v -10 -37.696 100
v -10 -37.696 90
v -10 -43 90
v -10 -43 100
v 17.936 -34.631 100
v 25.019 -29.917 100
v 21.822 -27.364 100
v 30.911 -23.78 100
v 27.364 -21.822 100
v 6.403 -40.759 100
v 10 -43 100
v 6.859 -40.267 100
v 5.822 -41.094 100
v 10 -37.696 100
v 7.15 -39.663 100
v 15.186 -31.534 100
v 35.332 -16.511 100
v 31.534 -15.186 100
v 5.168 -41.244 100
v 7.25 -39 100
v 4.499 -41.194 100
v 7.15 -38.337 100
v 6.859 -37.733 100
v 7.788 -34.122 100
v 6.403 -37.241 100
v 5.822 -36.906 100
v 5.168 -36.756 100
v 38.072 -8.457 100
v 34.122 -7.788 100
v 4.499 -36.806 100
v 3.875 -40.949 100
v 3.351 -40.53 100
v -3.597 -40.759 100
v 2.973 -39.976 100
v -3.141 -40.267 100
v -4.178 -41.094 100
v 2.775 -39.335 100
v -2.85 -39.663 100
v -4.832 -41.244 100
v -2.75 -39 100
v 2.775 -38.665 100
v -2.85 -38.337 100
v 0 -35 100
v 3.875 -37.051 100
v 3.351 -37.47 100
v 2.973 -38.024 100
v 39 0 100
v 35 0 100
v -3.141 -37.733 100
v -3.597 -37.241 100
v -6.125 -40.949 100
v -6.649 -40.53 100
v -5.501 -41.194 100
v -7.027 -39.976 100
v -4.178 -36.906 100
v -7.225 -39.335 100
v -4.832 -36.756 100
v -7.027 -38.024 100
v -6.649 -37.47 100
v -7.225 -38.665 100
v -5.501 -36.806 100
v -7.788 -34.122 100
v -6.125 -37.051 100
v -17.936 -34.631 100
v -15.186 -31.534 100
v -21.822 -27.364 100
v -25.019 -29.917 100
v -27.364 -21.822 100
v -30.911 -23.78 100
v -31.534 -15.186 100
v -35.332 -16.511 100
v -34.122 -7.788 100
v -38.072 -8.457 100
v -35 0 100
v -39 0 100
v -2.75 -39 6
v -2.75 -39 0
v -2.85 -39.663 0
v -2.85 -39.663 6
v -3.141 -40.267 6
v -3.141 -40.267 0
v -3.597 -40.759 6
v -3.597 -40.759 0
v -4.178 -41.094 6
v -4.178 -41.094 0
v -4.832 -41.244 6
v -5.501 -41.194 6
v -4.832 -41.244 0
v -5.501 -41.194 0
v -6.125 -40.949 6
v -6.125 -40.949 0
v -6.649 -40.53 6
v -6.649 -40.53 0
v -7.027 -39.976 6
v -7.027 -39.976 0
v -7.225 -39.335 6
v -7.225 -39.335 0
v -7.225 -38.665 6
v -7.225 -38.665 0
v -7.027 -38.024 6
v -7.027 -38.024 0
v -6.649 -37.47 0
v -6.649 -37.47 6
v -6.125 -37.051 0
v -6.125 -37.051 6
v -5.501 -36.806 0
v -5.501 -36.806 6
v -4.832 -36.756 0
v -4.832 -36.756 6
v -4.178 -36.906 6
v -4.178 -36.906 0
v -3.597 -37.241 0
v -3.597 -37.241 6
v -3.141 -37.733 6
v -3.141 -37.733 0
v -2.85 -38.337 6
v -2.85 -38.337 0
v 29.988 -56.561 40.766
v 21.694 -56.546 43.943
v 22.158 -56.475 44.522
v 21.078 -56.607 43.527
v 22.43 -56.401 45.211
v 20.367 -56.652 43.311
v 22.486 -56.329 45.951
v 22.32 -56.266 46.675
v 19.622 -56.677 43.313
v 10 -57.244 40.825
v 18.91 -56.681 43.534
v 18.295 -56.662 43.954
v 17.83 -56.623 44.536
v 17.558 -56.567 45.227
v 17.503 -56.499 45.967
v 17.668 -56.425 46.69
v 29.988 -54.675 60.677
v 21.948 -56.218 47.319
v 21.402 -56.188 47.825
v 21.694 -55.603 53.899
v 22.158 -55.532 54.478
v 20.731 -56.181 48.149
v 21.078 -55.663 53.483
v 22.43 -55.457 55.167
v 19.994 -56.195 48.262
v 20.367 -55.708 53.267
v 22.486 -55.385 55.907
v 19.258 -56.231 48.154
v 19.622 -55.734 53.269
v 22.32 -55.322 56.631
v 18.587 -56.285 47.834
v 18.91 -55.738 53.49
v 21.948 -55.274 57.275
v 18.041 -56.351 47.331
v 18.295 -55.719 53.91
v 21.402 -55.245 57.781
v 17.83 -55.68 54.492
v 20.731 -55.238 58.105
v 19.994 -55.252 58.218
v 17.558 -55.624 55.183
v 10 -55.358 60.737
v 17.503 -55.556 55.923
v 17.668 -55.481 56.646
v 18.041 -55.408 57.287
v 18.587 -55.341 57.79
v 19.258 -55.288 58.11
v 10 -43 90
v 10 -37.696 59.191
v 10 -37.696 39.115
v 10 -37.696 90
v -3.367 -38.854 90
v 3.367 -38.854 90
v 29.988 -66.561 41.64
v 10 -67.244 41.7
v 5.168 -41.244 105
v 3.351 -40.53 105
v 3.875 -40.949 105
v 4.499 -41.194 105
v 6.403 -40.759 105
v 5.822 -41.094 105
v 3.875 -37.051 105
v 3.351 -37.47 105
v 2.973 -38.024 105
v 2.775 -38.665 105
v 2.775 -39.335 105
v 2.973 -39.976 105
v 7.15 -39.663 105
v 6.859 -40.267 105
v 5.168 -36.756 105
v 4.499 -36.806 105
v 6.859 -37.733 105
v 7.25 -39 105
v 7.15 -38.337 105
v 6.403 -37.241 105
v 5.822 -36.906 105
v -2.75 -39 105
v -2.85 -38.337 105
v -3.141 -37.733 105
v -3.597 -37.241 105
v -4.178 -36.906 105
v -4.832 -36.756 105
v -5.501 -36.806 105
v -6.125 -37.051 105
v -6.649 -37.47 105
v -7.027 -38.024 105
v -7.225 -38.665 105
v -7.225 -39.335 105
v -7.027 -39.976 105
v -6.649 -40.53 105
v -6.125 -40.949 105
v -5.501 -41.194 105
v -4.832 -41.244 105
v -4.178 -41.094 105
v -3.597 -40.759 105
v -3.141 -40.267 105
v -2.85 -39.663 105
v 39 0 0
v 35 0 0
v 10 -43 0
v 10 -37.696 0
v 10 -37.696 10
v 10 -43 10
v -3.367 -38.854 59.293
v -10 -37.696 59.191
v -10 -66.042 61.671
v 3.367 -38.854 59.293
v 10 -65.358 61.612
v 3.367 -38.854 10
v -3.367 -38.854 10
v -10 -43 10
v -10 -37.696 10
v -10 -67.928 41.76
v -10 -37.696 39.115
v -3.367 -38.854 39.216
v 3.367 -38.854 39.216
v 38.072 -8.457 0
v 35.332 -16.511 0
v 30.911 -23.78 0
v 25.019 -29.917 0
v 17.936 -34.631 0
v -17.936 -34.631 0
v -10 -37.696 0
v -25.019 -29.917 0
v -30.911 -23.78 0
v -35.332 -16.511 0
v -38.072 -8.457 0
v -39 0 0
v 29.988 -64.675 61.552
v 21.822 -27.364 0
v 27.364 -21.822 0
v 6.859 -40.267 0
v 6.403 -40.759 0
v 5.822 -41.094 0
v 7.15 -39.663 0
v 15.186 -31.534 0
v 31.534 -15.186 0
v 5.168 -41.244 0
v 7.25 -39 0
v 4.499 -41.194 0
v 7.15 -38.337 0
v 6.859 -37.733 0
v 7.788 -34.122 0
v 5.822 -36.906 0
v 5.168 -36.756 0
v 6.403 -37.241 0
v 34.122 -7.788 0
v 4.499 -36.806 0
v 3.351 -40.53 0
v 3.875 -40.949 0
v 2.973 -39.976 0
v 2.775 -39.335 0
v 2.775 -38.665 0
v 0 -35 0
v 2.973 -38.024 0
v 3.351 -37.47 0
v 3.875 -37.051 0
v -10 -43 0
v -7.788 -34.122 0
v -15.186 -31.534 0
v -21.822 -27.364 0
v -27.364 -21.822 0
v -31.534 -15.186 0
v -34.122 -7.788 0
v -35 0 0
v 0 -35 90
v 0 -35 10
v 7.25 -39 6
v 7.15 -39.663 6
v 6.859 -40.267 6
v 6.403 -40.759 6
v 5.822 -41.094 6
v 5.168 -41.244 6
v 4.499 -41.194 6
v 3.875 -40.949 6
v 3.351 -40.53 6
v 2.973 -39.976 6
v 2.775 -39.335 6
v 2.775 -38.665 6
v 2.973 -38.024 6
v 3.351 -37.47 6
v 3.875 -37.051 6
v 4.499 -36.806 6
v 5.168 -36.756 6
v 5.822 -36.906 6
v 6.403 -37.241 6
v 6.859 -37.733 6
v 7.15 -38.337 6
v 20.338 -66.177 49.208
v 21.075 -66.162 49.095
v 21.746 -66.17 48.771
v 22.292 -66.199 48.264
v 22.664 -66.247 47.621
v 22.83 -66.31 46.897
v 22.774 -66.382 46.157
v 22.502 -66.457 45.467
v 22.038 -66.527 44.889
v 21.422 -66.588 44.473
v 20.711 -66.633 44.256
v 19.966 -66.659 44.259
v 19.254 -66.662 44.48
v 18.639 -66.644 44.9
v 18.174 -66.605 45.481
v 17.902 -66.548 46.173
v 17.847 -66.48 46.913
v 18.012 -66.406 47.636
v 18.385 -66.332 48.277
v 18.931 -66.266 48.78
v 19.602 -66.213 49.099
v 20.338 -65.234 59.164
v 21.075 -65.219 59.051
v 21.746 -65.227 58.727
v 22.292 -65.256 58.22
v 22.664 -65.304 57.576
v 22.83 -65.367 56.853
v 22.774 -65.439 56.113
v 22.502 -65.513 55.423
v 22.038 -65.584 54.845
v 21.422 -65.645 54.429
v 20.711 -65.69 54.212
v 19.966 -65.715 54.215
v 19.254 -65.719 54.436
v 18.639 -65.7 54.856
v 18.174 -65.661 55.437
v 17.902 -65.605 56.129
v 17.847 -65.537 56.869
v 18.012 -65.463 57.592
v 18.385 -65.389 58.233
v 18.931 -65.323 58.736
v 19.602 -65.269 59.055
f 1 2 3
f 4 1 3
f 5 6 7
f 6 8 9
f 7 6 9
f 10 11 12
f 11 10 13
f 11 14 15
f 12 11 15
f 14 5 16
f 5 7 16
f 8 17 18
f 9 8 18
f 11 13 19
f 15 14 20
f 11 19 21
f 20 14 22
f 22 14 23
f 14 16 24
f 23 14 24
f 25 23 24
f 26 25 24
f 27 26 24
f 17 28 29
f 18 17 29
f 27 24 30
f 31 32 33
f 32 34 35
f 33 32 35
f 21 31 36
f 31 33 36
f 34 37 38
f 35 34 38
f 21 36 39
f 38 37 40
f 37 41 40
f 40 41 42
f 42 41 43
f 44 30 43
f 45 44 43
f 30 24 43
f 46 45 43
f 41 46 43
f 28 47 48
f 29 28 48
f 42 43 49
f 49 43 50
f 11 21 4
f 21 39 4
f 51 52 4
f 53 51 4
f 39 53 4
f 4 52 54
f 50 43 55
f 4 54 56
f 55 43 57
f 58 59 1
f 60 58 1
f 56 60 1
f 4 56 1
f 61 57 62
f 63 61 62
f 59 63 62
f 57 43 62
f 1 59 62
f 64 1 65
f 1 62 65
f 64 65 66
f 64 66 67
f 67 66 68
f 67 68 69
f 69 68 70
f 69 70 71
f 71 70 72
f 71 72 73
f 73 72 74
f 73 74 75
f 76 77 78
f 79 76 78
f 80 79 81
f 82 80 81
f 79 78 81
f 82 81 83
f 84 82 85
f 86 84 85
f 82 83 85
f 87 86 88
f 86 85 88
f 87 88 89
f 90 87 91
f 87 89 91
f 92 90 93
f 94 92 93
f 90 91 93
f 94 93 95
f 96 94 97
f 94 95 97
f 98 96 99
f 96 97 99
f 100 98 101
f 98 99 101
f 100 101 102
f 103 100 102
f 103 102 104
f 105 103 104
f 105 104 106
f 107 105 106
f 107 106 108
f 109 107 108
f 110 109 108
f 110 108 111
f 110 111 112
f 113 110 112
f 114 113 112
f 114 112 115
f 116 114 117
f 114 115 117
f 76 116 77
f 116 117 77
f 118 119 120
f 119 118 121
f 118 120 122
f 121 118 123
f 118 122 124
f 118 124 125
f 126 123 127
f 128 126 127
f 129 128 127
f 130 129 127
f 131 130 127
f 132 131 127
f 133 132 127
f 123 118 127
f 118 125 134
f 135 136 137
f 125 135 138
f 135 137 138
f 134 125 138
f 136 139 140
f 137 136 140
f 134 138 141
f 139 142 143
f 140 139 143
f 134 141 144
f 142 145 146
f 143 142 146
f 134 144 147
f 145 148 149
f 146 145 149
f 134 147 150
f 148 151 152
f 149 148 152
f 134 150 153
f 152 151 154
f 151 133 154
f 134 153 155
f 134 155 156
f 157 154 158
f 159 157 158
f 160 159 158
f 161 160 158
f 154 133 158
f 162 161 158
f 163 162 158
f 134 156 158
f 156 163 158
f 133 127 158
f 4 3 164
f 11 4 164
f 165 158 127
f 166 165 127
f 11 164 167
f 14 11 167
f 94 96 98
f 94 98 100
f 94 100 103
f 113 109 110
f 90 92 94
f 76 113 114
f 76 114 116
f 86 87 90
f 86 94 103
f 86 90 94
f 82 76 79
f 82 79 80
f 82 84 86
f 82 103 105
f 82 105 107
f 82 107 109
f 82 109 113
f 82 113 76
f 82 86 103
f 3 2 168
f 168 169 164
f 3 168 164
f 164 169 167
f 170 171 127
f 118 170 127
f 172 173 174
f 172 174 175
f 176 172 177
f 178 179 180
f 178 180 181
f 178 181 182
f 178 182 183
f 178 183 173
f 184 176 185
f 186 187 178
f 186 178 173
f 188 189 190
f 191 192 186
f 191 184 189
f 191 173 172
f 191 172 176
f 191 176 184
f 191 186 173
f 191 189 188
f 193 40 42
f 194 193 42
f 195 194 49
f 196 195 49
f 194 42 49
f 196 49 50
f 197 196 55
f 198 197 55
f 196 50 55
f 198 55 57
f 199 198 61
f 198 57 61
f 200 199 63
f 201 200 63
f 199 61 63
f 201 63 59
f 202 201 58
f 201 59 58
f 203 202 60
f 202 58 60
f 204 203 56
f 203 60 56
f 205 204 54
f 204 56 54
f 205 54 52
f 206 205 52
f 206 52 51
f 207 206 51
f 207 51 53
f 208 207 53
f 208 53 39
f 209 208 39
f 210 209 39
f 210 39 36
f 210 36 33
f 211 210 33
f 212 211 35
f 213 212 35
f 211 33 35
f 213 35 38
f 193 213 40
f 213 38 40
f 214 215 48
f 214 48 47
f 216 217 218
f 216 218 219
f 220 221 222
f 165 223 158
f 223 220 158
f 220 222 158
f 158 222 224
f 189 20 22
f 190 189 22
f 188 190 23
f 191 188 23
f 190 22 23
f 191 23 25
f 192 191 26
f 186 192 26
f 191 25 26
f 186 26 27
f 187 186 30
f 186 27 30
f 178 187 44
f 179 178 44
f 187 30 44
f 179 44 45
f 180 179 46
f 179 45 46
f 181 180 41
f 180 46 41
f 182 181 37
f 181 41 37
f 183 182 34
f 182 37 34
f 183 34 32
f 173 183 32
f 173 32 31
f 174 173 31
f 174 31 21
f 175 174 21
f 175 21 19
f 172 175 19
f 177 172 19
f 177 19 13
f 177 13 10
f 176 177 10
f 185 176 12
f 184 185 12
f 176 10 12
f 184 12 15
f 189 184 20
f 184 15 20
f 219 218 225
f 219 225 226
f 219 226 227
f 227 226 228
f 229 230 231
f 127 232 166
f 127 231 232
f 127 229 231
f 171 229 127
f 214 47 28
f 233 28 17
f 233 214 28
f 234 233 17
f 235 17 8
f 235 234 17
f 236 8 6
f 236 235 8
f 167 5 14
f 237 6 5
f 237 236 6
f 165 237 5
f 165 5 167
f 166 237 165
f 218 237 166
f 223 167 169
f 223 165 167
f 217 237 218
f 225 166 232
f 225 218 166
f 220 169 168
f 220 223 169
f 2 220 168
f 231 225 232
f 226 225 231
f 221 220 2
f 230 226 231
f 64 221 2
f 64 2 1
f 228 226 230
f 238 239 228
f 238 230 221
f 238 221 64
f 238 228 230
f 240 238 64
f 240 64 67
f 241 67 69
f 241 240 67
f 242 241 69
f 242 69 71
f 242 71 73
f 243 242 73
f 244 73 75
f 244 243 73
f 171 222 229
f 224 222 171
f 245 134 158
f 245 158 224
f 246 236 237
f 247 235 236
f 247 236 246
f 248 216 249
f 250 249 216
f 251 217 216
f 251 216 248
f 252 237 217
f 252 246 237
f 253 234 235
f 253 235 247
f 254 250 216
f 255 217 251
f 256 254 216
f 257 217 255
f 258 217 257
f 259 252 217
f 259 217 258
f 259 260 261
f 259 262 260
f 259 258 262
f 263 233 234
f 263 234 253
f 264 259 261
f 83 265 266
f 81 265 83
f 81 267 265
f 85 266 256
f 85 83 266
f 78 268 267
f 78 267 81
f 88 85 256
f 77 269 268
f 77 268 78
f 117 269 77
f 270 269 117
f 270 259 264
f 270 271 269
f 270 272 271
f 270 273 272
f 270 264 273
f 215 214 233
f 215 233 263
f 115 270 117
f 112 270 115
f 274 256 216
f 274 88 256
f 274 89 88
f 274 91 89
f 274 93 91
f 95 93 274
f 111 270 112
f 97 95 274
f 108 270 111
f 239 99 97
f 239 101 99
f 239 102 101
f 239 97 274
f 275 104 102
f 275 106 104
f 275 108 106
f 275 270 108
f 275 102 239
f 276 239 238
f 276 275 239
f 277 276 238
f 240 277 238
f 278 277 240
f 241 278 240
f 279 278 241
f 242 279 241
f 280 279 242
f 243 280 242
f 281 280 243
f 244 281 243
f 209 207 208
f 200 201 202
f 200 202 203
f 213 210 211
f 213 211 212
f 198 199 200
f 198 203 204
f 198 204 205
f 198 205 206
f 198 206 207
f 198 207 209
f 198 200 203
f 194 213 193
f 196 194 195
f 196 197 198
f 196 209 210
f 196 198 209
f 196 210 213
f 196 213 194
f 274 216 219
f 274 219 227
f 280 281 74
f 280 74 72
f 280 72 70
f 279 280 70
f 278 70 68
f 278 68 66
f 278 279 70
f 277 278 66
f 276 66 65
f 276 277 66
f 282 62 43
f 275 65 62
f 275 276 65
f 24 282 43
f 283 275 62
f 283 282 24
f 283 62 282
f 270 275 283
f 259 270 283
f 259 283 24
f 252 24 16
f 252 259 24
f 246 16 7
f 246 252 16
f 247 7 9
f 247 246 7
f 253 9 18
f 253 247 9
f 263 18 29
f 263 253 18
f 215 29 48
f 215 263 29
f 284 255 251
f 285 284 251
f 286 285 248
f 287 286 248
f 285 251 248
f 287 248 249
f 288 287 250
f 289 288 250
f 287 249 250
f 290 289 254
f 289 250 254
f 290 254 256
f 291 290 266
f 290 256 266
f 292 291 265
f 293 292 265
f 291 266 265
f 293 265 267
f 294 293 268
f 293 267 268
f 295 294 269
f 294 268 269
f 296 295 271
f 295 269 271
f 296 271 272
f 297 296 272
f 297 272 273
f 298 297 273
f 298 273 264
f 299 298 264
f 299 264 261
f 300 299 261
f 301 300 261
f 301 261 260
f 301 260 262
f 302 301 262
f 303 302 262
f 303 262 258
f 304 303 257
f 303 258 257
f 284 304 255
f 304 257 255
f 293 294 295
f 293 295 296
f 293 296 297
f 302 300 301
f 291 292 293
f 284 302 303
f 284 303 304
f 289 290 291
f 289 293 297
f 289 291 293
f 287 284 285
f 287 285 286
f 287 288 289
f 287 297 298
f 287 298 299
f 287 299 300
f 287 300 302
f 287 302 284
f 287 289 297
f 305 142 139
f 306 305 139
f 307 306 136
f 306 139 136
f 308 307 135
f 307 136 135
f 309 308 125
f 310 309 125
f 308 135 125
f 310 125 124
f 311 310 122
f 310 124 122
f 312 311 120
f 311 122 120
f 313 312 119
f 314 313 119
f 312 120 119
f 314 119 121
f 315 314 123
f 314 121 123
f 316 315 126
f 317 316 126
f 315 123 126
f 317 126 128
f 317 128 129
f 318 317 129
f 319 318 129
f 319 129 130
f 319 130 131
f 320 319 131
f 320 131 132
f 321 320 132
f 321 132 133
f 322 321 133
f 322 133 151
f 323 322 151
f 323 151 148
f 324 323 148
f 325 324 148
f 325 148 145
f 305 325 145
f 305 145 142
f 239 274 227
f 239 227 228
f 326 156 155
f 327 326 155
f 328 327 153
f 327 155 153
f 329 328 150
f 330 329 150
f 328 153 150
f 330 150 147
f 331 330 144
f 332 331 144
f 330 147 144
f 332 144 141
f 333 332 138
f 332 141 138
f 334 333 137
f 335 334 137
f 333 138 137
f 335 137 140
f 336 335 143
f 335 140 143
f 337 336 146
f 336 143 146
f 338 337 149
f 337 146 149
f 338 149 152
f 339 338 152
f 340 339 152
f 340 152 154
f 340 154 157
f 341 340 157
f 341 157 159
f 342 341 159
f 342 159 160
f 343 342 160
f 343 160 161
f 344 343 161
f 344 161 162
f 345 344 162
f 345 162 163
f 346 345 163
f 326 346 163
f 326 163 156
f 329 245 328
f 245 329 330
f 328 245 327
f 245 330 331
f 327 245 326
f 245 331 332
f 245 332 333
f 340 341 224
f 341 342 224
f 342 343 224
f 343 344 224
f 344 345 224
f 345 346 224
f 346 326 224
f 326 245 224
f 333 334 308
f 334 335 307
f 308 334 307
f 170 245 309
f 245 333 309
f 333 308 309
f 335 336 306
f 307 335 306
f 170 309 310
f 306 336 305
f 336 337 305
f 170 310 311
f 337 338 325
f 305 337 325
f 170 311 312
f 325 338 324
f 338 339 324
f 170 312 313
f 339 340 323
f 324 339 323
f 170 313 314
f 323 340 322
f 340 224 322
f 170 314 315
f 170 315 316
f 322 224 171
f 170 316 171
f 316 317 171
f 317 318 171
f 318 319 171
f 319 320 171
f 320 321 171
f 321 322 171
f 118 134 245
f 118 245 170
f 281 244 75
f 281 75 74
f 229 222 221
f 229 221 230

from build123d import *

# Parameters (mm, degrees)
EXTRUDE_THIN1_DEPTH       = 100
BOSS_EXTRUDE1_START       = -10
BOSS_EXTRUDE1_DEPTH       = 10
SKETCH3_R                 = 2.25
BOSS_EXTRUDE2_DEPTH       = 5
BOSS_EXTRUDE3_DEPTH       = 10
SKETCH5_R                 = 2.25
CUT_EXTRUDE1_DEPTH        = 6
BOSS_EXTRUDE4_REACH       = 121.416
BOSS_EXTRUDE4_END_RADIUS  = 39
SKETCH10_W                = 20
SKETCH10_H                = 20
BOSS_EXTRUDE5_START       = -19.757252304
BOSS_EXTRUDE5_OUTLINE_W   = 20
BOSS_EXTRUDE5_OUTLINE_H   = 20
BOSS_EXTRUDE5_DEPTH       = 19.757252304
BOSS_EXTRUDE5_START_2     = 71.178890271
BOSS_EXTRUDE5_2_OUTLINE_W = 23
BOSS_EXTRUDE5_2_OUTLINE_H = 23
BOSS_EXTRUDE5_2_DEPTH     = 1.821109729
BOSS_EXTRUDE6_DEPTH       = 20
SKETCH12_R                = 2.5
CUT_EXTRUDE2_DEPTH        = 20


with BuildPart() as part:
    # Sketch1 → Extrude-Thin1 (new body)
    with BuildSketch(Plane.XY):
        with BuildLine():
            ThreePointArc((-35, 0), (0, -35), (35, 0))
            Line((35, 0), (39, 0))
            ThreePointArc((39, 0), (0, -39), (-39, 0))
            Line((-39, 0), (-35, 0))
        make_face()
    extrude(amount=EXTRUDE_THIN1_DEPTH)

    # Sketch2 → Boss-Extrude1 (add)
    with BuildSketch(Plane.XY.offset(100).offset(BOSS_EXTRUDE1_START)):
        with BuildLine():
            Line((0, -39), (0, -35))
            Line((0, -35), (-10, -35))
            Line((-10, -35), (-10, -37.69615365))
            ThreePointArc((-10, -37.69615365), (-5.042321274, -38.672664715), (0, -39))
        make_face()
        with BuildLine():
            Line((10, -35), (0, -35))
            Line((0, -35), (0, -39))
            ThreePointArc((0, -39), (5.042321274, -38.672664715), (10, -37.69615365))
            Line((10, -37.69615365), (10, -35))
        make_face()
        with BuildLine():
            ThreePointArc((10, -37.69615365), (5.042321274, -38.672664715), (0, -39))
            ThreePointArc((0, -39), (-5.042321274, -38.672664715), (-10, -37.69615365))
            Line((-10, -37.69615365), (-10, -43))
            Line((-10, -43), (10, -43))
            Line((10, -43), (10, -37.69615365))
        make_face()
    extrude(amount=BOSS_EXTRUDE1_DEPTH)

    # Sketch3 → Boss-Extrude2 (add)
    with BuildSketch(Plane.XY.offset(100)):
        with Locations((-5, -39)):
            Circle(SKETCH3_R)
        with Locations((5, -39)):
            Circle(SKETCH3_R)
    extrude(amount=BOSS_EXTRUDE2_DEPTH)

    # Sketch4 → Boss-Extrude3 (add)
    with BuildSketch(Plane(origin=(0, 0, 0), x_dir=(-1, 0, 0), z_dir=(0, 0, -1))):
        with BuildLine():
            Line((0, -39), (0, -35))
            Line((0, -35), (-10, -35))
            Line((-10, -35), (-10, -37.69615365))
            ThreePointArc((-10, -37.69615365), (-5.042321274, -38.672664715), (0, -39))
        make_face()
        with BuildLine():
            ThreePointArc((10, -37.69615365), (5.042321274, -38.672664715), (0, -39))
            ThreePointArc((0, -39), (-5.042321274, -38.672664715), (-10, -37.69615365))
            Line((-10, -37.69615365), (-10, -43))
            Line((-10, -43), (10, -43))
            Line((10, -43), (10, -37.69615365))
        make_face()
        with BuildLine():
            Line((10, -35), (0, -35))
            Line((0, -35), (0, -39))
            ThreePointArc((0, -39), (5.042321274, -38.672664715), (10, -37.69615365))
            Line((10, -37.69615365), (10, -35))
        make_face()
    extrude(amount=-BOSS_EXTRUDE3_DEPTH)

    # Sketch5 → Cut-Extrude1 (cut)
    with BuildSketch(Plane(origin=(0, 0, 0), x_dir=(-1, 0, 0), z_dir=(0, 0, -1))):
        with Locations(Location((-5, -39, 0), (0, 0, 180))):
            Circle(SKETCH5_R)
        with Locations(Location((5, -39, 0), (0, 0, 180))):
            Circle(SKETCH5_R)
    extrude(amount=-CUT_EXTRUDE1_DEPTH, mode=Mode.SUBTRACT)

    # Boss-Extrude4: up to this cylinder (the profile starts outside it)
    boss_extrude4_end = Plane(origin=(0, 0, 50), z_dir=(0, 0, -1)) * Cylinder(BOSS_EXTRUDE4_END_RADIUS, 321.832, mode=Mode.PRIVATE)
    # Sketch10 → Boss-Extrude4 (add, up to the surface)
    with BuildSketch(Plane(origin=(0, -51.355775573, 4.493048169), x_dir=(1, 0, 0), z_dir=(0, 0.9961946980917462, -0.08715574274765152)), mode=Mode.PRIVATE) as boss_extrude4_sk1:
        with Locations((0, -45.680780994)):
            Rectangle(SKETCH10_W, SKETCH10_H)
    boss_extrude4_tool1 = extrude(boss_extrude4_sk1.sketch, amount=BOSS_EXTRUDE4_REACH, mode=Mode.PRIVATE) - boss_extrude4_end
    add(boss_extrude4_tool1.solids().sort_by_distance((0, -47.374433, 50))[0])

    # Boss-Extrude5: read off the stored shape, not the designer's step
    # Boss-Extrude5 outline → Boss-Extrude5 (add)
    with BuildSketch(Plane(origin=(0, -51.355775573, 4.493048169), x_dir=(1, 0, 0), z_dir=(0, 0.9961946980917462, -0.08715574274765152)).offset(BOSS_EXTRUDE5_START)):
        with Locations((0, -45.680780994)):
            Rectangle(BOSS_EXTRUDE5_OUTLINE_W, BOSS_EXTRUDE5_OUTLINE_H)
    extrude(amount=BOSS_EXTRUDE5_DEPTH)

    # Boss-Extrude5 2 outline → Boss-Extrude5 2 (cut)
    with BuildSketch(Plane(origin=(0, 0, 0), x_dir=(0.9994119135527714, 0.0341374804572781, -0.0032341114416133587), z_dir=(0.034290334626361094, -0.9949568891477218, 0.09426007473315587)).offset(BOSS_EXTRUDE5_START_2)):
        with Locations((-2.5, 45.5)):
            Rectangle(BOSS_EXTRUDE5_2_OUTLINE_W, BOSS_EXTRUDE5_2_OUTLINE_H)
    extrude(amount=BOSS_EXTRUDE5_2_DEPTH, mode=Mode.SUBTRACT)

    # Sketch11 → Boss-Extrude6 (add, along a direction that is not the sketch's normal)
    with BuildSketch(Plane(origin=(10, 0, 0), x_dir=(0, 0, -1), z_dir=(1, 0, 0))):
        Polygon((-41.700202309, -67.244443924), (-40.825315674, -57.244443924), (-60.736677348, -55.358084364), (-61.611563983, -65.358084364), align=None)
    extrude(amount=BOSS_EXTRUDE6_DEPTH, dir=(0.9994118831812419, 0.03416073136677643, -0.002988676732382235))

    # Sketch12 → Cut-Extrude2 (cut)
    with BuildSketch(Plane(origin=(2.096746102, -60.838484135, 5.763707075), x_dir=(0.9994101830326217, 0.03396190638807499, -0.005086744065644943), z_dir=(-0.03429033462636107, 0.994956889147722, -0.09426007473315641))):
        with Locations(Location((17.832976273, -40.280011427, 0), (0, 0, 269.893376297))):
            Circle(SKETCH12_R)
        with Locations(Location((17.814365976, -50.280510703, 0), (0, 0, 269.893376297))):
            Circle(SKETCH12_R)
    extrude(amount=-CUT_EXTRUDE2_DEPTH, mode=Mode.SUBTRACT)


solid = part.part
